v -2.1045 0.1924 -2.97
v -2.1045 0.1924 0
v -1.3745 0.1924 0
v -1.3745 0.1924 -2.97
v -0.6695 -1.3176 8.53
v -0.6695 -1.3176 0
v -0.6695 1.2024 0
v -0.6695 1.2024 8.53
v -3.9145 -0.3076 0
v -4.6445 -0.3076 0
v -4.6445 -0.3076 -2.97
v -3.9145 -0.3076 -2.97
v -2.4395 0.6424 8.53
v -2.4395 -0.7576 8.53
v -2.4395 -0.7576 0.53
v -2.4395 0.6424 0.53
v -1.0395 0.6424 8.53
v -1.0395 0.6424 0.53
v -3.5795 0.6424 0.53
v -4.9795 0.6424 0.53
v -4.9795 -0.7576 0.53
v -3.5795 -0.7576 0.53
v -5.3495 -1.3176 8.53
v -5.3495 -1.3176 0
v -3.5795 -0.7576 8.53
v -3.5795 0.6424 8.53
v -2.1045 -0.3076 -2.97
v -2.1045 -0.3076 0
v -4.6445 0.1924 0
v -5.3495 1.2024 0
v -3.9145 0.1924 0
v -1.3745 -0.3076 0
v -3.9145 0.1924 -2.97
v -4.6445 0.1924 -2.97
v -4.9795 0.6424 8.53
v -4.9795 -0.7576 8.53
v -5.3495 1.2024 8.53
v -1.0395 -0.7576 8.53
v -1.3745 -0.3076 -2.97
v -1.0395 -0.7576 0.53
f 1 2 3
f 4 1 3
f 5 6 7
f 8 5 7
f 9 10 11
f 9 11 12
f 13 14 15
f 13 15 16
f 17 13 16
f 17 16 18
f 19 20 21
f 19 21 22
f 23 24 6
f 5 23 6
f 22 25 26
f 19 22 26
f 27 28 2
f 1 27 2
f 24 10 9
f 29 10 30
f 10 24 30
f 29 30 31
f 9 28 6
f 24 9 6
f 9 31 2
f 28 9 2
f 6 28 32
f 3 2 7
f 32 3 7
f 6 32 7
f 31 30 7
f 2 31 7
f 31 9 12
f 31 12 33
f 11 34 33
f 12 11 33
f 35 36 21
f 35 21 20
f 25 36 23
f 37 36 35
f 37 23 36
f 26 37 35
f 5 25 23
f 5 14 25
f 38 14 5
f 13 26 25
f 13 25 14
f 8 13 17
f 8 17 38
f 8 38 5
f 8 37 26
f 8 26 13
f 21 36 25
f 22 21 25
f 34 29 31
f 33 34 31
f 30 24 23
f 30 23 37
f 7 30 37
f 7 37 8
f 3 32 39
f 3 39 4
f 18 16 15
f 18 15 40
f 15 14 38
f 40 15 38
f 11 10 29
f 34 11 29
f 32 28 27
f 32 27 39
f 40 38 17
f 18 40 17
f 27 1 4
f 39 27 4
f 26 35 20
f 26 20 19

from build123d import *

# Parameters (mm, degrees)
SKETCH1_W               = 4.68
SKETCH1_H               = 2.52
COMPONENT_OUTLINE_DEPTH = 8.53
SKETCH2_W               = 1.4
SKETCH2_H               = 1.4
CUT_EXTRUDE1_DEPTH      = 8
LPATTERN1_COUNT         = 2
LPATTERN1_PITCH         = 2.54
SKETCH3_W               = 0.73
SKETCH3_H               = 0.5
BOSS_EXTRUDE1_DEPTH     = 3.5
LPATTERN2_COUNT         = 2
LPATTERN2_PITCH         = 2.54


with BuildPart() as part:
    # Sketch1 → Component_Outline (new body)
    with BuildSketch(Plane.XY):
        with Locations((-3.009528536, -0.057617866)):
            Rectangle(SKETCH1_W, SKETCH1_H)
    extrude(amount=COMPONENT_OUTLINE_DEPTH)

    # Sketch2 → Cut-Extrude1 (cut)
    with BuildSketch(Plane.XY.offset(8.53)):
        with Locations((-1.739528536, -0.057617866)):
            Rectangle(SKETCH2_W, SKETCH2_H)
    cut_extrude1 = extrude(amount=-CUT_EXTRUDE1_DEPTH, mode=Mode.SUBTRACT)

    # LPattern1: Cut-Extrude1 ×2
    with Locations(*[(-i * LPATTERN1_PITCH, 0, 0) for i in range(1, LPATTERN1_COUNT)]):
        add(cut_extrude1, mode=Mode.SUBTRACT)

    # Sketch3 → Boss-Extrude1 (add)
    with BuildSketch(Plane.XY.offset(0.53)):
        with Locations((-1.739528536, -0.057617866)):
            Rectangle(SKETCH3_W, SKETCH3_H)
    boss_extrude1 = extrude(amount=-BOSS_EXTRUDE1_DEPTH)

    # LPattern2: Boss-Extrude1 ×2
    with Locations(*[(-i * LPATTERN2_PITCH, 0, 0) for i in range(1, LPATTERN2_COUNT)]):
        add(boss_extrude1)


solid = part.part
